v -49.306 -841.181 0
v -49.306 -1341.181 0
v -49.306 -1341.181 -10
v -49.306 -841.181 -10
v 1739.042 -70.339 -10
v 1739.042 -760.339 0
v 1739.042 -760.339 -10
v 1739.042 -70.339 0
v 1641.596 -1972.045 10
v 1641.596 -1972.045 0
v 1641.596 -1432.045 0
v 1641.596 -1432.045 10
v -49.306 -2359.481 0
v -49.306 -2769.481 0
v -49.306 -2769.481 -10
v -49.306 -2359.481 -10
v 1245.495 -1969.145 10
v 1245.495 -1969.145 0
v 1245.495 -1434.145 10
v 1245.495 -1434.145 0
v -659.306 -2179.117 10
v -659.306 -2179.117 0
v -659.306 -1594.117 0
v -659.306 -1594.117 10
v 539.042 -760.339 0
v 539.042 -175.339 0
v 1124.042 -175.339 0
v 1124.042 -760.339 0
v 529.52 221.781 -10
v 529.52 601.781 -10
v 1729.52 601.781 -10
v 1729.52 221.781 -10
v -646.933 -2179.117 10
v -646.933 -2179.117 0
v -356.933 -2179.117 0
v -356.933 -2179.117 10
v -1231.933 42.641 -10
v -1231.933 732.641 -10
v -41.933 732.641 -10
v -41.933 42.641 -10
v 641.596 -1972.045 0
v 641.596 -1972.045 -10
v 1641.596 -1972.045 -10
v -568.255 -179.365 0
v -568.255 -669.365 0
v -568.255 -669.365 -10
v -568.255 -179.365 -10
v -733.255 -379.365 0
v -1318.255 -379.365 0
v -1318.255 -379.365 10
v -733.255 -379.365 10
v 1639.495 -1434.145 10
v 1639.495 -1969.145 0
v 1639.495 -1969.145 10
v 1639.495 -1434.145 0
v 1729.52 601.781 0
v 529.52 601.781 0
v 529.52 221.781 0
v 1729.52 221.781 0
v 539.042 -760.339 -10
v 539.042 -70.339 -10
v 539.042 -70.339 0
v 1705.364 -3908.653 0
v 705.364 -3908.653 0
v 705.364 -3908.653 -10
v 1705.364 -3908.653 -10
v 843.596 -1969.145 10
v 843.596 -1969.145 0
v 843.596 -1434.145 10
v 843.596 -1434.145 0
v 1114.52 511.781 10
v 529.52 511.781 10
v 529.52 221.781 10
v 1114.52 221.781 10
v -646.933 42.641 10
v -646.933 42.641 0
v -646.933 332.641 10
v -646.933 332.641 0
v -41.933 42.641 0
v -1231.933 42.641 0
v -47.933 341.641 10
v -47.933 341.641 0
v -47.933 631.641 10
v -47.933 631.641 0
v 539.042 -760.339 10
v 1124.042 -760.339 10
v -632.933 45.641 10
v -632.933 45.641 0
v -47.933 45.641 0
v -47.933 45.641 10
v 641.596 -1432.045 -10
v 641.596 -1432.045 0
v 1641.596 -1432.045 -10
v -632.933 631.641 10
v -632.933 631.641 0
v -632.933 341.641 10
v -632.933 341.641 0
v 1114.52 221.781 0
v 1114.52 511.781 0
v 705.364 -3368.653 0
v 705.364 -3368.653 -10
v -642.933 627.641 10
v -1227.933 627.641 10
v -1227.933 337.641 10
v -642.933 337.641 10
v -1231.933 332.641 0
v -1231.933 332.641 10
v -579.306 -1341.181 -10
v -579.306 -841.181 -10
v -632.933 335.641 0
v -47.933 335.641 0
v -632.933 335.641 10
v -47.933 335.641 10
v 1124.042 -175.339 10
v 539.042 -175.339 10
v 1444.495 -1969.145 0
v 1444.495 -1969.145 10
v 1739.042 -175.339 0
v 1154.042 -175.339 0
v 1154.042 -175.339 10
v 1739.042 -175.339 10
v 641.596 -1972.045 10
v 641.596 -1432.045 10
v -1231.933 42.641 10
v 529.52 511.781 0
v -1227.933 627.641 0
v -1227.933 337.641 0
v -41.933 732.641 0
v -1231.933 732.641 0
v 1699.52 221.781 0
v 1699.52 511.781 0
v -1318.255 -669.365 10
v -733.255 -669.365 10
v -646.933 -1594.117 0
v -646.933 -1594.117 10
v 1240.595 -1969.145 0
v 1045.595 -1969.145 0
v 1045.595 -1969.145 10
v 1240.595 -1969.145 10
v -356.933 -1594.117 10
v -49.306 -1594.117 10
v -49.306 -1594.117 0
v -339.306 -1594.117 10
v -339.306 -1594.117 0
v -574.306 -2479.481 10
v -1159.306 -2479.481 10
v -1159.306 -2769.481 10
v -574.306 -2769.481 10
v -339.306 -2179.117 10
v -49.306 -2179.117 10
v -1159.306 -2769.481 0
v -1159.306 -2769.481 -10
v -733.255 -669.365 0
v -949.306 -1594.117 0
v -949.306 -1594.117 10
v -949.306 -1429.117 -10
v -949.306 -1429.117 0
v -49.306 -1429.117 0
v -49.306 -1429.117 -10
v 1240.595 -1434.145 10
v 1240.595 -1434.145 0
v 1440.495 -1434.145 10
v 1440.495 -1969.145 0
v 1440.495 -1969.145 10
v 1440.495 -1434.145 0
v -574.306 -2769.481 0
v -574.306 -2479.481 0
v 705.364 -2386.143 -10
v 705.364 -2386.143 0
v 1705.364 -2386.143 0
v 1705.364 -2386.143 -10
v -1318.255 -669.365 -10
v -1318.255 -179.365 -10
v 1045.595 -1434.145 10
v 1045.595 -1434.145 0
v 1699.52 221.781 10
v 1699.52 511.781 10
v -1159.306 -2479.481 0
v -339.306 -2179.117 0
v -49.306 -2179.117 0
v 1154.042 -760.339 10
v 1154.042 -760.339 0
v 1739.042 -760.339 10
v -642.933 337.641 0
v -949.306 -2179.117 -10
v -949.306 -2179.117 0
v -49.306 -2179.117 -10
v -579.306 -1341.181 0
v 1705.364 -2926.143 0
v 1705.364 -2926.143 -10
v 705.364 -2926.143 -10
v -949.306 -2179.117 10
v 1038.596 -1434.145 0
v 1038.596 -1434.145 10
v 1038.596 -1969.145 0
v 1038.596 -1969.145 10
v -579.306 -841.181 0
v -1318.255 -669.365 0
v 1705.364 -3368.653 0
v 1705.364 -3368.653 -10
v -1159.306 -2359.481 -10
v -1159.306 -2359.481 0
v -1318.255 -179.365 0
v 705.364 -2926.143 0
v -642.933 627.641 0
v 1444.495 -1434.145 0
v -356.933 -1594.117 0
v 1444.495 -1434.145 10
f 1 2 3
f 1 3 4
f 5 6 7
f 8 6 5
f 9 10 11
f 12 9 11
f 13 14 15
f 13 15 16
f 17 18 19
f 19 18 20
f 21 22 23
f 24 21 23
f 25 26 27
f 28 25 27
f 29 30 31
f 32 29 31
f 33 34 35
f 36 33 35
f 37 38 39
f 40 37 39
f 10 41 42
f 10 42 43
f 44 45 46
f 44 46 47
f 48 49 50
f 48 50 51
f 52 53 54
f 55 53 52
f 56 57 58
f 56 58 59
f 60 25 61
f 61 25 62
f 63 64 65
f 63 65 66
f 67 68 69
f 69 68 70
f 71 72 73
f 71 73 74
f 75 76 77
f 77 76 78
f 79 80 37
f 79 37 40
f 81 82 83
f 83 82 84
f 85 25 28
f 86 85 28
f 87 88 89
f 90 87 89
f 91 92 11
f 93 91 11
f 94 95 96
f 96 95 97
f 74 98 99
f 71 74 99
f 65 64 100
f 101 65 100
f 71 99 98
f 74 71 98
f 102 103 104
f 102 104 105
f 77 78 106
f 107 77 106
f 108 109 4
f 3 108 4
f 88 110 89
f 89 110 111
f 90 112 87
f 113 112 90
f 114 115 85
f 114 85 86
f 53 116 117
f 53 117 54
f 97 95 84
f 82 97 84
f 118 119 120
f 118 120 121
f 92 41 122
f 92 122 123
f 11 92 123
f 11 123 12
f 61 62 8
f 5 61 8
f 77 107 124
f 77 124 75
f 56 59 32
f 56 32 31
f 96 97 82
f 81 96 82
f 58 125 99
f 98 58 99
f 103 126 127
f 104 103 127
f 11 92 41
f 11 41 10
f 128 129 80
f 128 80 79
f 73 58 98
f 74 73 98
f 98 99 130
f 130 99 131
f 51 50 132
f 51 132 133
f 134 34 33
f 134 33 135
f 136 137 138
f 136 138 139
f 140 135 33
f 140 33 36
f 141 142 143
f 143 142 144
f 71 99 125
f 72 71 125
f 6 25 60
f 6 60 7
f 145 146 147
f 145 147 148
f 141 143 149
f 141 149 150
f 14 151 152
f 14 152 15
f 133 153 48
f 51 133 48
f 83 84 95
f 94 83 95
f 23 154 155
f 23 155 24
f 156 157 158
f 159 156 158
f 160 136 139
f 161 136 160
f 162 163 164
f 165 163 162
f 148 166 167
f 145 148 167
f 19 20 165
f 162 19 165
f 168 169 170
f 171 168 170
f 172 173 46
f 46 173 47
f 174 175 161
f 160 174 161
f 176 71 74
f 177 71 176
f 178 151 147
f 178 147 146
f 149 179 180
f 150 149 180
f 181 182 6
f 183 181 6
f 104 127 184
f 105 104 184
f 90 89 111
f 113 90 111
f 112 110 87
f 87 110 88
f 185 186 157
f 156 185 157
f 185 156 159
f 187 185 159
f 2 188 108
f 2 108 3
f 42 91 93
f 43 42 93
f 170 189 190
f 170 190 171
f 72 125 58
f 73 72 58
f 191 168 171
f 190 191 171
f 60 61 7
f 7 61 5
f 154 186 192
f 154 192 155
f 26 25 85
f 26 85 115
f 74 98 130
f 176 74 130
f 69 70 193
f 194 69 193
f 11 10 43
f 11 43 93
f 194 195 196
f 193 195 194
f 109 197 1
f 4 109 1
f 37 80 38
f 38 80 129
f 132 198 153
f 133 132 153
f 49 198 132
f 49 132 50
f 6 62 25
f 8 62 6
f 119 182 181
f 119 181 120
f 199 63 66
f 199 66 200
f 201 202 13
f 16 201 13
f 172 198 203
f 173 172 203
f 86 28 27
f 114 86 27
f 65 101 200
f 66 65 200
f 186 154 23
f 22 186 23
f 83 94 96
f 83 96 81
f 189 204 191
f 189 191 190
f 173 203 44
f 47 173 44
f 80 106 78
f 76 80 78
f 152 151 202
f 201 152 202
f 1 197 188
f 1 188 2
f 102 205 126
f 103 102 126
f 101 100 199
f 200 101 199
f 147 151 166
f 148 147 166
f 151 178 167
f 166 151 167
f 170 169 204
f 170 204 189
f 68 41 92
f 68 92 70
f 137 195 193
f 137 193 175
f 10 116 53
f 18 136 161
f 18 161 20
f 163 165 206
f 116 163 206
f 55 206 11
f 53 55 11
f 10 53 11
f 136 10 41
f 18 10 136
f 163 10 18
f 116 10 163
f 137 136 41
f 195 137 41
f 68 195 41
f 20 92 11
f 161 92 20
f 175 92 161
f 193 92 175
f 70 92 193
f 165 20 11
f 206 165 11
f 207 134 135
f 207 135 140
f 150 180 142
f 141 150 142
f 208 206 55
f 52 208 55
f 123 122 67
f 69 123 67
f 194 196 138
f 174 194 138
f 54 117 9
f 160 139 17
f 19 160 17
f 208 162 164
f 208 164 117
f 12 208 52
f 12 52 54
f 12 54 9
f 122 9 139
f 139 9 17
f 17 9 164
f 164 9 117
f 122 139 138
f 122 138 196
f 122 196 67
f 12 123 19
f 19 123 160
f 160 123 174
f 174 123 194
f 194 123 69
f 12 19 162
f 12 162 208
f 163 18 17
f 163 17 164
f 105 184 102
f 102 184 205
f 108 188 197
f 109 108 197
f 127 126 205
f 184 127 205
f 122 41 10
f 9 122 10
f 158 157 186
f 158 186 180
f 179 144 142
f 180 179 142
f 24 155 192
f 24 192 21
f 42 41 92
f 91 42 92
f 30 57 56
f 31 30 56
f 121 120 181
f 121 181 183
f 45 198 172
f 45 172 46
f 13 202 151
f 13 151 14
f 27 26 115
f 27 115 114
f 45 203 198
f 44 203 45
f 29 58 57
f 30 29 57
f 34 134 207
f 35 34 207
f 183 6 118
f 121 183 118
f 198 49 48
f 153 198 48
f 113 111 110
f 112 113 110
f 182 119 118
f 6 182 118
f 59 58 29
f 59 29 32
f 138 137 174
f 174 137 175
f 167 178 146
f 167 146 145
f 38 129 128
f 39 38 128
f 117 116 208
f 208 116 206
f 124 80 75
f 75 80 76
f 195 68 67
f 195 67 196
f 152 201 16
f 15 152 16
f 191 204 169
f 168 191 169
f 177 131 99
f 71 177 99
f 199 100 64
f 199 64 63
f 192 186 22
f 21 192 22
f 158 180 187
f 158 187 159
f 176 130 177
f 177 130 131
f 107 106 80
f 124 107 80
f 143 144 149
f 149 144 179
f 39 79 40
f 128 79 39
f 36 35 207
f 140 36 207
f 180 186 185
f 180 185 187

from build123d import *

# Parameters (mm, degrees)
F0_W     = 1190
F0_H     = 690
F2_DEPTH = 10
F0_W_2   = 750
F0_H_2   = 490
F0_W_3   = 530
F0_H_3   = 500
F0_W_4   = 900
F0_H_4   = 750
F0_W_5   = 1110
F0_H_5   = 410
F0_W_6   = 1200
F0_H_6   = 380
F0_W_7   = 1000
F0_H_7   = 540
F3_DEPTH = 10
F1_W     = 290
F1_H     = 585
F1_W_2   = 585
F1_H_2   = 290
F1_W_3   = 1000
F1_H_3   = 540
F1_W_4   = 195
F1_H_4   = 535


# Not quite as in the source:
# - ends of sketch curves that miss each other by under 0.0002 mm in the source are joined


with BuildPart() as f2:
    # F0 (on Top) → F2 (new body)
    with BuildSketch(Plane.XY):
        with Locations((-636.9328212738, 387.6405593753)):
            Rectangle(F0_W, F0_H)
    extrude(amount=-F2_DEPTH)


with BuildPart() as f2b:
    # F0 (on Top) → F2, piece 2 (new body)
    with BuildSketch(Plane.XY):
        with Locations((-943.2546496391, -424.365465641)):
            Rectangle(F0_W_2, F0_H_2)
    extrude(amount=-F2_DEPTH)


with BuildPart() as f2c:
    # F0 (on Top) → F2, piece 3 (new body)
    with BuildSketch(Plane.XY):
        with Locations((-314.3055731058, -1091.1808013916)):
            Rectangle(F0_W_3, F0_H_3)
    extrude(amount=-F2_DEPTH)


with BuildPart() as f2d:
    # F0 (on Top) → F2, piece 4 (new body)
    with BuildSketch(Plane.XY):
        with Locations((-499.3055731058, -1804.1169643402)):
            Rectangle(F0_W_4, F0_H_4)
    extrude(amount=-F2_DEPTH)


with BuildPart() as f2e:
    # F0 (on Top) → F2, piece 5 (new body)
    with BuildSketch(Plane.XY):
        with Locations((-604.3055731058, -2564.4809436798)):
            Rectangle(F0_W_5, F0_H_5)
    extrude(amount=-F2_DEPTH)


with BuildPart() as f2f:
    # F0 (on Top) → F2, piece 6 (new body)
    with BuildSketch(Plane.XY):
        with Locations((1129.5203924179, 411.7811346054)):
            Rectangle(F0_W_6, F0_H_6)
    extrude(amount=-F2_DEPTH)


with BuildPart() as f2g:
    # F0 (on Top) → F2, piece 7 (new body)
    with BuildSketch(Plane.XY):
        with Locations((1139.0423536301, -415.3386044502)):
            Rectangle(F0_W_6, F0_H)
    extrude(amount=-F2_DEPTH)


with BuildPart() as f2h:
    # F0 (on Top) → F2, piece 8 (new body)
    with BuildSketch(Plane.XY):
        with Locations((1141.5956020355, -1702.0453023911)):
            Rectangle(F0_W_7, F0_H_7)
    extrude(amount=-F2_DEPTH)


with BuildPart() as f2i:
    # F0 (on Top) → F2, piece 9 (new body)
    with BuildSketch(Plane.XY):
        with Locations((1205.3639888763, -2656.1429309845)):
            Rectangle(F0_W_7, F0_H_7)
    extrude(amount=-F2_DEPTH)


with BuildPart() as f2j:
    # F0 (on Top) → F2, piece 10 (new body)
    with BuildSketch(Plane.XY):
        with Locations((1205.3639888763, -3638.6525440216)):
            Rectangle(F0_W_7, F0_H_7)
    extrude(amount=-F2_DEPTH)


with BuildPart() as f3:
    # F1 (on Top) → F3 (new body)
    with BuildSketch(Plane.XY):
        Polygon((-642.9328784943, 337.6405584812), (-642.9328784943, 627.6405584812), (-1227.9328784943, 627.6405593753), (-1227.9328784943, 337.6405593753), align=None)
    extrude(amount=F3_DEPTH)


with BuildPart() as f3b:
    # F1 (on Top) → F3, piece 2 (new body)
    with BuildSketch(Plane.XY):
        Polygon((-47.9328799248, 341.6405907273), (-47.9328799248, 631.6405907273), (-632.9328799248, 631.6405907273), (-632.9328799248, 341.6405916214), align=None)
    extrude(amount=F3_DEPTH)


with BuildPart() as f3c:
    # F1 (on Top) → F3, piece 3 (new body)
    with BuildSketch(Plane.XY):
        Polygon((-646.9328784943, 332.6405593753), (-1231.9328784943, 332.6405593753), (-1231.9328212738, 42.6405593753), (-646.9328892231, 42.6405593753), align=None)
    extrude(amount=F3_DEPTH)


with BuildPart() as f3d:
    # F1 (on Top) → F3, piece 4 (new body)
    with BuildSketch(Plane.XY):
        Polygon((-47.9328751564, 335.6405584812), (-632.9328751564, 335.6405584812), (-632.9328751564, 45.6405593753), (-47.9328966141, 45.6405593753), align=None)
    extrude(amount=F3_DEPTH)


with BuildPart() as f3e:
    # F1 (on Top) → F3, piece 5 (new body)
    with BuildSketch(Plane.XY):
        with Locations((-804.3055731058, -1886.6169643402)):
            Rectangle(F1_W, F1_H)
    extrude(amount=F3_DEPTH)


with BuildPart() as f3f:
    # F1 (on Top) → F3, piece 6 (new body)
    with BuildSketch(Plane.XY):
        with Locations((-501.9328999519, -1886.6169643402)):
            Rectangle(F1_W, F1_H)
    extrude(amount=F3_DEPTH)


with BuildPart() as f3g:
    # F1 (on Top) → F3, piece 7 (new body)
    with BuildSketch(Plane.XY):
        Polygon((-49.3055731058, -2179.1169643402), (-49.3055731058, -1594.1169452667), (-339.3055731058, -1594.1169261932), (-339.3055731058, -2179.1169643402), align=None)
    extrude(amount=F3_DEPTH)


with BuildPart() as f3h:
    # F1 (on Top) → F3, piece 8 (new body)
    with BuildSketch(Plane.XY):
        with Locations((-866.8055731058, -2624.4809436798)):
            Rectangle(F1_W_2, F1_H_2)
    extrude(amount=F3_DEPTH)


with BuildPart() as f3i:
    # F1 (on Top) → F3, piece 9 (new body)
    with BuildSketch(Plane.XY):
        Polygon((1114.5203924179, 511.7811346054), (529.5203924179, 511.7811346054), (529.5203924179, 221.7811346054), (1114.5204114914, 221.7811346054), align=None)
    extrude(amount=F3_DEPTH)


with BuildPart() as f3j:
    # F1 (on Top) → F3, piece 10 (new body)
    with BuildSketch(Plane.XY):
        Polygon((1114.5204114914, 221.7811346054), (1699.5204305649, 221.7811346054), (1699.5204305649, 511.7811346054), (1114.5204305649, 511.7811346054), align=None)
    extrude(amount=F3_DEPTH)


with BuildPart() as f3k:
    # F1 (on Top) → F3, piece 11 (new body)
    with BuildSketch(Plane.XY):
        with Locations((831.5423536301, -467.8386044502)):
            Rectangle(F1_W_2, F1_H)
    extrude(amount=F3_DEPTH)


with BuildPart() as f3l:
    # F1 (on Top) → F3, piece 12 (new body)
    with BuildSketch(Plane.XY):
        with Locations((1446.5423536301, -467.8386044502)):
            Rectangle(F1_W_2, F1_H)
    extrude(amount=F3_DEPTH)


with BuildPart() as f3m:
    # F1 (on Top) → F3, piece 13 (new body)
    with BuildSketch(Plane.XY):
        with Locations((1141.5956020355, -1702.0453023911)):
            Rectangle(F1_W_3, F1_H_3)
        with Locations((941.0955572128, -1701.645450592)):
            Rectangle(F1_W_4, F1_H_4, mode=Mode.SUBTRACT)
        with Locations((1143.0952882767, -1701.645450592)):
            Rectangle(F1_W_4, F1_H_4, mode=Mode.SUBTRACT)
        with Locations((1342.9953193665, -1701.6454172134)):
            Rectangle(F1_W_4, F1_H_4, mode=Mode.SUBTRACT)
        with Locations((1541.9953203201, -1701.6454172134)):
            Rectangle(F1_W_4, F1_H_4, mode=Mode.SUBTRACT)
    extrude(amount=F3_DEPTH)


with BuildPart() as f3n:
    # F1 (on Top) → F3, piece 14 (new body)
    with BuildSketch(Plane.XY):
        with Locations((-1025.7546496391, -524.365465641)):
            Rectangle(F1_W_2, F1_H_2)
    extrude(amount=F3_DEPTH)


solid = Compound([f2.part, f2b.part, f2c.part, f2d.part, f2e.part, f2f.part, f2g.part, f2h.part, f2i.part, f2j.part, f3.part, f3b.part, f3c.part, f3d.part, f3e.part, f3f.part, f3g.part, f3h.part, f3i.part, f3j.part, f3k.part, f3l.part, f3m.part, f3n.part])
